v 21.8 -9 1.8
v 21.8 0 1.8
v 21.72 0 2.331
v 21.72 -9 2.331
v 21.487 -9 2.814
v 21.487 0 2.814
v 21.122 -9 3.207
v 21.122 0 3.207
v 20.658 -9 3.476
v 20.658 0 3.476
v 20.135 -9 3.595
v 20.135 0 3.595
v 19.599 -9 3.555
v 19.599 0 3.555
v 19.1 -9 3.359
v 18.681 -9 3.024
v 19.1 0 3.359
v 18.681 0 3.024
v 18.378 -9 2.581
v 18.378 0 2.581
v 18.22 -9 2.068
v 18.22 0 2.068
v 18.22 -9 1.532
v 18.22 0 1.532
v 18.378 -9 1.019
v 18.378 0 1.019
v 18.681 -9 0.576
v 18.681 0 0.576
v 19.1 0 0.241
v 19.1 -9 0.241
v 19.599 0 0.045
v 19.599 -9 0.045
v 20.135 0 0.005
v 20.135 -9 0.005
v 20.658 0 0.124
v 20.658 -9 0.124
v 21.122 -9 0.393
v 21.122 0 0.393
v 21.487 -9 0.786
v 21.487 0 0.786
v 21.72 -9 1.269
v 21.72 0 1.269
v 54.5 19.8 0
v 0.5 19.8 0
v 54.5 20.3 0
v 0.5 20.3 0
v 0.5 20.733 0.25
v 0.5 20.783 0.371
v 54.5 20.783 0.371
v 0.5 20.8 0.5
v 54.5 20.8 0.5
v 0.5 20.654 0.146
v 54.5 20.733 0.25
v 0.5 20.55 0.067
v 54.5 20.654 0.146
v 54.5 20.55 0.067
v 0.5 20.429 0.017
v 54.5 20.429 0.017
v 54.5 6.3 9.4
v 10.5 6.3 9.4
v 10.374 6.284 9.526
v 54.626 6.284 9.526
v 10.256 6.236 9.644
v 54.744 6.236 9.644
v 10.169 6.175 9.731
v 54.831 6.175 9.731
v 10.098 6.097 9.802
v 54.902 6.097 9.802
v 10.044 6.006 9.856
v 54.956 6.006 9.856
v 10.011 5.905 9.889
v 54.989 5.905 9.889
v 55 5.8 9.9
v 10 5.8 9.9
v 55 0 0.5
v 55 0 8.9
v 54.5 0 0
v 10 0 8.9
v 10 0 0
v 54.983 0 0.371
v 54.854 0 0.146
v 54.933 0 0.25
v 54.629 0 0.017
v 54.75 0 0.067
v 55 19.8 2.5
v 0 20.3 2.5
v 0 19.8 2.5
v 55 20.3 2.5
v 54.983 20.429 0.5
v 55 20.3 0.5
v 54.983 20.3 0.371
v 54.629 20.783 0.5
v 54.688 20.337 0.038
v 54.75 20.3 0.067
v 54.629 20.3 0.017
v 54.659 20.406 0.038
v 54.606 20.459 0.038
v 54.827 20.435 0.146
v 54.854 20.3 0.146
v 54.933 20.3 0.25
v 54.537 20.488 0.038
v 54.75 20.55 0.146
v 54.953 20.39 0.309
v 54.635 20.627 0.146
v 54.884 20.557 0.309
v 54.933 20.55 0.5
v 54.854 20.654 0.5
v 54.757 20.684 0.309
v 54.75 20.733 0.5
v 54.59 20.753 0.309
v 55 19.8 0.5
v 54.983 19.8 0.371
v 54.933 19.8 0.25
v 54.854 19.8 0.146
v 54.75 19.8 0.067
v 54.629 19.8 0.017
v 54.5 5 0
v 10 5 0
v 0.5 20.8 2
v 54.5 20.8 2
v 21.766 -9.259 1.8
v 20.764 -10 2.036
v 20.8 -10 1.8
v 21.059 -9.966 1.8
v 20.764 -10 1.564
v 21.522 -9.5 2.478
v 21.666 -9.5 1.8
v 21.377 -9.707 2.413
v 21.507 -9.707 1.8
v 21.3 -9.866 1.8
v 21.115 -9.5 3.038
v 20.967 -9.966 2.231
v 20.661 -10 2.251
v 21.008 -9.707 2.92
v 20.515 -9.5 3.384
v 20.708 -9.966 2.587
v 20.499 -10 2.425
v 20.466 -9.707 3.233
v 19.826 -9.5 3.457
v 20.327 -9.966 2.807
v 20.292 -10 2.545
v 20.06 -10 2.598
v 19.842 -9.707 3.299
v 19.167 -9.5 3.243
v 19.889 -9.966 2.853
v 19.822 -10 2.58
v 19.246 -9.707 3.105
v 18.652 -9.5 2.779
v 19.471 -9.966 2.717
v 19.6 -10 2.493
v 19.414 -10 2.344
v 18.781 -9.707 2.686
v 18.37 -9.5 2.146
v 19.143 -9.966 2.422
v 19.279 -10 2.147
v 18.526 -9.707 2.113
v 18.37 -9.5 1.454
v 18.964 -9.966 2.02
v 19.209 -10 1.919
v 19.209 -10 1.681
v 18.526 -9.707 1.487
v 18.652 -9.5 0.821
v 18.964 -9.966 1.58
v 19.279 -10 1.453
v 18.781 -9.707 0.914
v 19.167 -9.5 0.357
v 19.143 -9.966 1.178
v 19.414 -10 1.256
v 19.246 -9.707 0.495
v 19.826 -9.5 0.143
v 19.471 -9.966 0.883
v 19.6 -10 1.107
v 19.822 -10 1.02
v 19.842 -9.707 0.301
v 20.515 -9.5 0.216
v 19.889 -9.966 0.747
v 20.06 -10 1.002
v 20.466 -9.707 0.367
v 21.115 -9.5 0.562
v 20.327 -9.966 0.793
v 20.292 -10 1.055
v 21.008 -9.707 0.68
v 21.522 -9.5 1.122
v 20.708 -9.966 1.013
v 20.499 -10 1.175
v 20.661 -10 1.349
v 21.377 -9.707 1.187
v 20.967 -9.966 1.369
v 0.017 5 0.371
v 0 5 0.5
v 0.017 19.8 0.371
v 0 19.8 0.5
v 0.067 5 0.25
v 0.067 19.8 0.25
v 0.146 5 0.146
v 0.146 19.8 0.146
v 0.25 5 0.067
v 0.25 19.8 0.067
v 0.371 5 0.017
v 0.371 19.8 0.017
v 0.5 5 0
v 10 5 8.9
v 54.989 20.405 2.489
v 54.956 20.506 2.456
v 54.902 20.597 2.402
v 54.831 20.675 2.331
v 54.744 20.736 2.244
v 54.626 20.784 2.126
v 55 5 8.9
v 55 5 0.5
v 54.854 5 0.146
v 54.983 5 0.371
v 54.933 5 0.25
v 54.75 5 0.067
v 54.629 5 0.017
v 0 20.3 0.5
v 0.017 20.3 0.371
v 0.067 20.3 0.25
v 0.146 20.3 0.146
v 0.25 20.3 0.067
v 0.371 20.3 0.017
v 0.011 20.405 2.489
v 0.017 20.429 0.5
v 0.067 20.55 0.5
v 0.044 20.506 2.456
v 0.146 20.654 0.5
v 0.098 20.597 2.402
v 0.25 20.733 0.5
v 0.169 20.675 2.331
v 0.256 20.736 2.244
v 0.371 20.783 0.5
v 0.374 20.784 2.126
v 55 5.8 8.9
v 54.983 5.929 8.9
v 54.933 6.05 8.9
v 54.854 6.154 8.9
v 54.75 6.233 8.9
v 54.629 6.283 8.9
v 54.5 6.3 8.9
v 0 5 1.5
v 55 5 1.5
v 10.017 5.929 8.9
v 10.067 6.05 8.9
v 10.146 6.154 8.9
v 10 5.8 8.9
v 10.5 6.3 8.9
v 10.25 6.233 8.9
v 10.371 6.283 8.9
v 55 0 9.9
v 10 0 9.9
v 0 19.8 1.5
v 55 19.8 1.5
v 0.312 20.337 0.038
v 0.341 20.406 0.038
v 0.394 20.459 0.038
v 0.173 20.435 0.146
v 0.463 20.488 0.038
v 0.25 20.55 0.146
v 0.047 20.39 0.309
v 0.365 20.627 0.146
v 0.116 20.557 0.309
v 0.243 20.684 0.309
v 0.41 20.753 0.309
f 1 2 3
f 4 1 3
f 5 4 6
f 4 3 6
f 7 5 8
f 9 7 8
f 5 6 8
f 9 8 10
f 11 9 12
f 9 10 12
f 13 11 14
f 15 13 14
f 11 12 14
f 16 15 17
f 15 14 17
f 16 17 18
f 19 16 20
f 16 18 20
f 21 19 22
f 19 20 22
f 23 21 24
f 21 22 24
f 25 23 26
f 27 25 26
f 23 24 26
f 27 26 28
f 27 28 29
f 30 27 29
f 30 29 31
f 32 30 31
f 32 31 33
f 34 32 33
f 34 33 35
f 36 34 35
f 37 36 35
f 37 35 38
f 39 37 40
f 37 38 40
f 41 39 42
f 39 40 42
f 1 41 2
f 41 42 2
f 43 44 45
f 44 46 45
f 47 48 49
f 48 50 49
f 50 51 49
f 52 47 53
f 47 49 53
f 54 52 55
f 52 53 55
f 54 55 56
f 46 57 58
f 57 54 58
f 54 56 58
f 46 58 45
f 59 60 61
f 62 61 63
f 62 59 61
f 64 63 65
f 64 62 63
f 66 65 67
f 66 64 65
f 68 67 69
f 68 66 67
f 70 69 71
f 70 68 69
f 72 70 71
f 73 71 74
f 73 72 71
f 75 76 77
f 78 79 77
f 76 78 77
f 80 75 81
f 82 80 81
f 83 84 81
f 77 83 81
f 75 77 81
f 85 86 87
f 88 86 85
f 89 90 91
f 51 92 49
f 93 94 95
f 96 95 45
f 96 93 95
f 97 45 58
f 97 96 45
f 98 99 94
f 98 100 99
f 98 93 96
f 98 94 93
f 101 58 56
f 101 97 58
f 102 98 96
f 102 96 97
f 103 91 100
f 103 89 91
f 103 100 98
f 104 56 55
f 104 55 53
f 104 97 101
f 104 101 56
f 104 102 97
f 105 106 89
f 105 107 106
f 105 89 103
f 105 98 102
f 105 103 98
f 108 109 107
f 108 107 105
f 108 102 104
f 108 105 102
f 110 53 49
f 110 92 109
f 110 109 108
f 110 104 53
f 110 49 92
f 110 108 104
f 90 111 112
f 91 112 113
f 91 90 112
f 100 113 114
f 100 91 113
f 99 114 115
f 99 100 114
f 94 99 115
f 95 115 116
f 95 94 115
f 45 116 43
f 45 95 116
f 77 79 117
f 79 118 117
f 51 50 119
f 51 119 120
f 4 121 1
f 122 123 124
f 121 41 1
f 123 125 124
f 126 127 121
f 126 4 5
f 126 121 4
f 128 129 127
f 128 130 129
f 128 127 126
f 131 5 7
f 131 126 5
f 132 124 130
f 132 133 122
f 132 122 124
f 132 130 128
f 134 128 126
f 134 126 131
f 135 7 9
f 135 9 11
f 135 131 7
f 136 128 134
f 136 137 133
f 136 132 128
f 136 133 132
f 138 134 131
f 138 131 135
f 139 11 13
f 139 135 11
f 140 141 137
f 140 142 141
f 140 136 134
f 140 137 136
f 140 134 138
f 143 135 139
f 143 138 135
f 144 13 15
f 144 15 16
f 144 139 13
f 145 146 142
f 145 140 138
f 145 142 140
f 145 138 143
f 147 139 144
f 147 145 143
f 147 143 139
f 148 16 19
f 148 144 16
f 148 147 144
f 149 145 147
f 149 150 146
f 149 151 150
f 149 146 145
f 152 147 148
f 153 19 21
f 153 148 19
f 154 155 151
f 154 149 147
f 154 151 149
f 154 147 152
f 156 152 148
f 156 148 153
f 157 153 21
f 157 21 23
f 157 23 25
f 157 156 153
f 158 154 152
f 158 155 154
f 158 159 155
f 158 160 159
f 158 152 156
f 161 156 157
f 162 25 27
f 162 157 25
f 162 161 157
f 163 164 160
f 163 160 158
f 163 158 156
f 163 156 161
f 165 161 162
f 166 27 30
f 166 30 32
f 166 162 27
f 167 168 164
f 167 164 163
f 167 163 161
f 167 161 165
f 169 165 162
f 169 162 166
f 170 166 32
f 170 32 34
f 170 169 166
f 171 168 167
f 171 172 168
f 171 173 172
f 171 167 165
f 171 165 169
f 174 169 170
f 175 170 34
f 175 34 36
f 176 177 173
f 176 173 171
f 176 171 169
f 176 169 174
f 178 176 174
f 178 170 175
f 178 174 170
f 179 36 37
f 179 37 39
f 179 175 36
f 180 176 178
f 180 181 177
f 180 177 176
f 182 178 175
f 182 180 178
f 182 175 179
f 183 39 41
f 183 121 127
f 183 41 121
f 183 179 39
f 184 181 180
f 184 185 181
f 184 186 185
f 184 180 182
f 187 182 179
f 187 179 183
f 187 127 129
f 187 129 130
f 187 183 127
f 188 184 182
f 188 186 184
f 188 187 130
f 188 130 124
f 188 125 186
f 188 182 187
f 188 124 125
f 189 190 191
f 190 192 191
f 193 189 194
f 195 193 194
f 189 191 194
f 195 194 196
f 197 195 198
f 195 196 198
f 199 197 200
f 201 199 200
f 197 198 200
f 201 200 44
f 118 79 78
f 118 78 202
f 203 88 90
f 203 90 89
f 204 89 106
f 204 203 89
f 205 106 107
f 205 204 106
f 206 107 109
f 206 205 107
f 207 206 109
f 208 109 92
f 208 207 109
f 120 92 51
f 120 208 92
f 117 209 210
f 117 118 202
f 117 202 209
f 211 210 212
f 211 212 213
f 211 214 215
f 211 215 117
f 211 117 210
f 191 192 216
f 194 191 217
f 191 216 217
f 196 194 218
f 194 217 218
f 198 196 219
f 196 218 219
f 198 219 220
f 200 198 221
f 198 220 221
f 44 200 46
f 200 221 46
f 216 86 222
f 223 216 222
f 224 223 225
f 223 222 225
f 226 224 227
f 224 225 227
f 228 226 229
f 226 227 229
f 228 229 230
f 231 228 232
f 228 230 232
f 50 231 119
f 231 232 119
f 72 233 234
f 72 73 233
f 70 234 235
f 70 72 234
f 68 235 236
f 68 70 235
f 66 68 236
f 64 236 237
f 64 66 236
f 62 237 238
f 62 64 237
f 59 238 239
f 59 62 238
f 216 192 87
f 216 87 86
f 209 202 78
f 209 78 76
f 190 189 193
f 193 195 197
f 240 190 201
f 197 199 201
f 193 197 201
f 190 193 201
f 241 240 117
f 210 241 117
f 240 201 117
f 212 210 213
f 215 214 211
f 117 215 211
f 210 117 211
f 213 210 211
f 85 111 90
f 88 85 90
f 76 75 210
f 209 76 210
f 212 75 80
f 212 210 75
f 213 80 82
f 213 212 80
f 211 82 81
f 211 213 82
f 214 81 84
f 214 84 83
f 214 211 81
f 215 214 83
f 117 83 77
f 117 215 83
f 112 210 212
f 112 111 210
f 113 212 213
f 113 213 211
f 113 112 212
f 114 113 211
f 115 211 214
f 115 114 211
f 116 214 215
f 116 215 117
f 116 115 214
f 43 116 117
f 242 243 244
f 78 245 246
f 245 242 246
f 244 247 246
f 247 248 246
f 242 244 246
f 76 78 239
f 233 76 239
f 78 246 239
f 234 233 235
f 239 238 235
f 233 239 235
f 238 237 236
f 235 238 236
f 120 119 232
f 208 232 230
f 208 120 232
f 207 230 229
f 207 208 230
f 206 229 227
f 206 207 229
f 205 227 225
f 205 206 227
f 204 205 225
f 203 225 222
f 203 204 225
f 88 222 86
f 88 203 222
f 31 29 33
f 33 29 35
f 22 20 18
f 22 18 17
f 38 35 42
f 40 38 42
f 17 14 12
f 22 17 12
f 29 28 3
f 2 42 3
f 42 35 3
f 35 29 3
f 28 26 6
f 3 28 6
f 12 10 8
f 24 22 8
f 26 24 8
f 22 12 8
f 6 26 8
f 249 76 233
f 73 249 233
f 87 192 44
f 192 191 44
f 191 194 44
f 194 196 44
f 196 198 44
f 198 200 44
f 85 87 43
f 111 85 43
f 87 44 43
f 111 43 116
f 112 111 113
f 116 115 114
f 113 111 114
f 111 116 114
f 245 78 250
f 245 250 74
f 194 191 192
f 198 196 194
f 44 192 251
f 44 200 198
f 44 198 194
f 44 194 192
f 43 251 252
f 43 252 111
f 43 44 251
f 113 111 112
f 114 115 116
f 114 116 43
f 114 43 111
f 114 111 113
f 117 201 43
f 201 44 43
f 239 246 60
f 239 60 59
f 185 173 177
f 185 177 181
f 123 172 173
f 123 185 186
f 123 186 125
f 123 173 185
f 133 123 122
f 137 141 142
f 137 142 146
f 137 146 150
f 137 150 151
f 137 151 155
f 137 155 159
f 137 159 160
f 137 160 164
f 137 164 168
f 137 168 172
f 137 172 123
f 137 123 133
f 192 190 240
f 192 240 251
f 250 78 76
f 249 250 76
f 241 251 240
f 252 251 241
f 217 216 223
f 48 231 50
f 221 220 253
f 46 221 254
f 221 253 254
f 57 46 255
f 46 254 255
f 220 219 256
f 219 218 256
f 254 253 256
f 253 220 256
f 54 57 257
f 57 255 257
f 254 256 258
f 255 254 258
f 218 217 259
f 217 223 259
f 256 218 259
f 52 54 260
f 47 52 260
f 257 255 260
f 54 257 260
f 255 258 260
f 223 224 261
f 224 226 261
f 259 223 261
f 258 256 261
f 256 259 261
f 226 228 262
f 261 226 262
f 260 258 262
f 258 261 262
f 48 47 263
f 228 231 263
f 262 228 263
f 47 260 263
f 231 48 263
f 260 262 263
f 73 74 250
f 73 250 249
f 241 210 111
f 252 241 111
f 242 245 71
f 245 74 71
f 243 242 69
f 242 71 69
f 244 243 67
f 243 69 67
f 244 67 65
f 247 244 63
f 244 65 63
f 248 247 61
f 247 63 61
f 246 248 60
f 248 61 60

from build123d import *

# Parameters (mm, degrees)
CYLINDER_R     = 1.8
CYLINDER_DEPTH = 10
FILLET_R       = 1
BOX002_W       = 55
BOX002_H       = 1
BOX002_DEPTH   = 2.5
FILLET001_R    = 0.5
BOX001_W       = 55
BOX001_H       = 14.8
BOX001_DEPTH   = 1.5
FILLET003_R    = 0.5
BOX_W          = 45
BOX_H          = 5
BOX_DEPTH      = 8.9
FILLET004_R    = 0.5
BOX003_W       = 45
BOX003_H       = 6.3
BOX003_DEPTH   = 1
FILLET005_R    = 0.5


with BuildPart() as fillet_body:
    # Cylinder → Cylinder (new body)
    with BuildSketch(Plane(origin=(20, 0, 1.8), x_dir=(1, 0, 0), z_dir=(0, -1, 0))):
        Circle(CYLINDER_R)
    extrude(amount=CYLINDER_DEPTH)

    # Fillet
    fillet_edges = [fillet_body.edges().sort_by_distance(p)[0] for p in [
        (18.2, -10, 1.8),
    ]]
    fillet(fillet_edges, radius=FILLET_R)


with BuildPart() as fillet001:
    # Box002 → Box002 (new body)
    with BuildSketch(Plane(origin=(0, 19.8, 0), x_dir=(1, 0, 0), z_dir=(0, 0, 1))):
        with Locations((27.5, 0.5)):
            Rectangle(BOX002_W, BOX002_H)
    extrude(amount=BOX002_DEPTH)

    # Fillet001
    fillet001_edges = [fillet001.edges().sort_by_distance(p)[0] for p in [
        (0, 20.8, 1.25),
        (0, 20.3, 0),
        (55, 20.8, 1.25),
        (55, 20.3, 0),
        (27.5, 20.8, 0),
        (27.5, 20.8, 2.5),
    ]]
    fillet(fillet001_edges, radius=FILLET001_R)


with BuildPart() as fillet003:
    # Box001 → Box001 (new body)
    with BuildSketch(Plane(origin=(0, 5, 0), x_dir=(1, 0, 0), z_dir=(0, 0, 1))):
        with Locations((27.5, 7.4)):
            Rectangle(BOX001_W, BOX001_H)
    extrude(amount=BOX001_DEPTH)

    # Fillet003
    fillet003_edges = [fillet003.edges().sort_by_distance(p)[0] for p in [
        (0, 12.4, 0),
        (55, 12.4, 0),
    ]]
    fillet(fillet003_edges, radius=FILLET003_R)


with BuildPart() as fillet004:
    # Box → Box (new body)
    with BuildSketch(Plane(origin=(10, 0, 0), x_dir=(1, 0, 0), z_dir=(0, 0, 1))):
        with Locations((22.5, 2.5)):
            Rectangle(BOX_W, BOX_H)
    extrude(amount=BOX_DEPTH)

    # Fillet004
    fillet004_edges = [fillet004.edges().sort_by_distance(p)[0] for p in [
        (55, 2.5, 0),
    ]]
    fillet(fillet004_edges, radius=FILLET004_R)


with BuildPart() as fillet005:
    # Box003 → Box003 (new body)
    with BuildSketch(Plane(origin=(10, 0, 8.9), x_dir=(1, 0, 0), z_dir=(0, 0, 1))):
        with Locations((22.5, 3.15)):
            Rectangle(BOX003_W, BOX003_H)
    extrude(amount=BOX003_DEPTH)

    # Fillet005
    fillet005_edges = [fillet005.edges().sort_by_distance(p)[0] for p in [
        (10, 6.3, 9.4),
        (55, 6.3, 9.4),
        (32.5, 6.3, 9.9),
    ]]
    fillet(fillet005_edges, radius=FILLET005_R)


solid = Compound([fillet_body.part, fillet001.part, fillet003.part, fillet004.part, fillet005.part])
